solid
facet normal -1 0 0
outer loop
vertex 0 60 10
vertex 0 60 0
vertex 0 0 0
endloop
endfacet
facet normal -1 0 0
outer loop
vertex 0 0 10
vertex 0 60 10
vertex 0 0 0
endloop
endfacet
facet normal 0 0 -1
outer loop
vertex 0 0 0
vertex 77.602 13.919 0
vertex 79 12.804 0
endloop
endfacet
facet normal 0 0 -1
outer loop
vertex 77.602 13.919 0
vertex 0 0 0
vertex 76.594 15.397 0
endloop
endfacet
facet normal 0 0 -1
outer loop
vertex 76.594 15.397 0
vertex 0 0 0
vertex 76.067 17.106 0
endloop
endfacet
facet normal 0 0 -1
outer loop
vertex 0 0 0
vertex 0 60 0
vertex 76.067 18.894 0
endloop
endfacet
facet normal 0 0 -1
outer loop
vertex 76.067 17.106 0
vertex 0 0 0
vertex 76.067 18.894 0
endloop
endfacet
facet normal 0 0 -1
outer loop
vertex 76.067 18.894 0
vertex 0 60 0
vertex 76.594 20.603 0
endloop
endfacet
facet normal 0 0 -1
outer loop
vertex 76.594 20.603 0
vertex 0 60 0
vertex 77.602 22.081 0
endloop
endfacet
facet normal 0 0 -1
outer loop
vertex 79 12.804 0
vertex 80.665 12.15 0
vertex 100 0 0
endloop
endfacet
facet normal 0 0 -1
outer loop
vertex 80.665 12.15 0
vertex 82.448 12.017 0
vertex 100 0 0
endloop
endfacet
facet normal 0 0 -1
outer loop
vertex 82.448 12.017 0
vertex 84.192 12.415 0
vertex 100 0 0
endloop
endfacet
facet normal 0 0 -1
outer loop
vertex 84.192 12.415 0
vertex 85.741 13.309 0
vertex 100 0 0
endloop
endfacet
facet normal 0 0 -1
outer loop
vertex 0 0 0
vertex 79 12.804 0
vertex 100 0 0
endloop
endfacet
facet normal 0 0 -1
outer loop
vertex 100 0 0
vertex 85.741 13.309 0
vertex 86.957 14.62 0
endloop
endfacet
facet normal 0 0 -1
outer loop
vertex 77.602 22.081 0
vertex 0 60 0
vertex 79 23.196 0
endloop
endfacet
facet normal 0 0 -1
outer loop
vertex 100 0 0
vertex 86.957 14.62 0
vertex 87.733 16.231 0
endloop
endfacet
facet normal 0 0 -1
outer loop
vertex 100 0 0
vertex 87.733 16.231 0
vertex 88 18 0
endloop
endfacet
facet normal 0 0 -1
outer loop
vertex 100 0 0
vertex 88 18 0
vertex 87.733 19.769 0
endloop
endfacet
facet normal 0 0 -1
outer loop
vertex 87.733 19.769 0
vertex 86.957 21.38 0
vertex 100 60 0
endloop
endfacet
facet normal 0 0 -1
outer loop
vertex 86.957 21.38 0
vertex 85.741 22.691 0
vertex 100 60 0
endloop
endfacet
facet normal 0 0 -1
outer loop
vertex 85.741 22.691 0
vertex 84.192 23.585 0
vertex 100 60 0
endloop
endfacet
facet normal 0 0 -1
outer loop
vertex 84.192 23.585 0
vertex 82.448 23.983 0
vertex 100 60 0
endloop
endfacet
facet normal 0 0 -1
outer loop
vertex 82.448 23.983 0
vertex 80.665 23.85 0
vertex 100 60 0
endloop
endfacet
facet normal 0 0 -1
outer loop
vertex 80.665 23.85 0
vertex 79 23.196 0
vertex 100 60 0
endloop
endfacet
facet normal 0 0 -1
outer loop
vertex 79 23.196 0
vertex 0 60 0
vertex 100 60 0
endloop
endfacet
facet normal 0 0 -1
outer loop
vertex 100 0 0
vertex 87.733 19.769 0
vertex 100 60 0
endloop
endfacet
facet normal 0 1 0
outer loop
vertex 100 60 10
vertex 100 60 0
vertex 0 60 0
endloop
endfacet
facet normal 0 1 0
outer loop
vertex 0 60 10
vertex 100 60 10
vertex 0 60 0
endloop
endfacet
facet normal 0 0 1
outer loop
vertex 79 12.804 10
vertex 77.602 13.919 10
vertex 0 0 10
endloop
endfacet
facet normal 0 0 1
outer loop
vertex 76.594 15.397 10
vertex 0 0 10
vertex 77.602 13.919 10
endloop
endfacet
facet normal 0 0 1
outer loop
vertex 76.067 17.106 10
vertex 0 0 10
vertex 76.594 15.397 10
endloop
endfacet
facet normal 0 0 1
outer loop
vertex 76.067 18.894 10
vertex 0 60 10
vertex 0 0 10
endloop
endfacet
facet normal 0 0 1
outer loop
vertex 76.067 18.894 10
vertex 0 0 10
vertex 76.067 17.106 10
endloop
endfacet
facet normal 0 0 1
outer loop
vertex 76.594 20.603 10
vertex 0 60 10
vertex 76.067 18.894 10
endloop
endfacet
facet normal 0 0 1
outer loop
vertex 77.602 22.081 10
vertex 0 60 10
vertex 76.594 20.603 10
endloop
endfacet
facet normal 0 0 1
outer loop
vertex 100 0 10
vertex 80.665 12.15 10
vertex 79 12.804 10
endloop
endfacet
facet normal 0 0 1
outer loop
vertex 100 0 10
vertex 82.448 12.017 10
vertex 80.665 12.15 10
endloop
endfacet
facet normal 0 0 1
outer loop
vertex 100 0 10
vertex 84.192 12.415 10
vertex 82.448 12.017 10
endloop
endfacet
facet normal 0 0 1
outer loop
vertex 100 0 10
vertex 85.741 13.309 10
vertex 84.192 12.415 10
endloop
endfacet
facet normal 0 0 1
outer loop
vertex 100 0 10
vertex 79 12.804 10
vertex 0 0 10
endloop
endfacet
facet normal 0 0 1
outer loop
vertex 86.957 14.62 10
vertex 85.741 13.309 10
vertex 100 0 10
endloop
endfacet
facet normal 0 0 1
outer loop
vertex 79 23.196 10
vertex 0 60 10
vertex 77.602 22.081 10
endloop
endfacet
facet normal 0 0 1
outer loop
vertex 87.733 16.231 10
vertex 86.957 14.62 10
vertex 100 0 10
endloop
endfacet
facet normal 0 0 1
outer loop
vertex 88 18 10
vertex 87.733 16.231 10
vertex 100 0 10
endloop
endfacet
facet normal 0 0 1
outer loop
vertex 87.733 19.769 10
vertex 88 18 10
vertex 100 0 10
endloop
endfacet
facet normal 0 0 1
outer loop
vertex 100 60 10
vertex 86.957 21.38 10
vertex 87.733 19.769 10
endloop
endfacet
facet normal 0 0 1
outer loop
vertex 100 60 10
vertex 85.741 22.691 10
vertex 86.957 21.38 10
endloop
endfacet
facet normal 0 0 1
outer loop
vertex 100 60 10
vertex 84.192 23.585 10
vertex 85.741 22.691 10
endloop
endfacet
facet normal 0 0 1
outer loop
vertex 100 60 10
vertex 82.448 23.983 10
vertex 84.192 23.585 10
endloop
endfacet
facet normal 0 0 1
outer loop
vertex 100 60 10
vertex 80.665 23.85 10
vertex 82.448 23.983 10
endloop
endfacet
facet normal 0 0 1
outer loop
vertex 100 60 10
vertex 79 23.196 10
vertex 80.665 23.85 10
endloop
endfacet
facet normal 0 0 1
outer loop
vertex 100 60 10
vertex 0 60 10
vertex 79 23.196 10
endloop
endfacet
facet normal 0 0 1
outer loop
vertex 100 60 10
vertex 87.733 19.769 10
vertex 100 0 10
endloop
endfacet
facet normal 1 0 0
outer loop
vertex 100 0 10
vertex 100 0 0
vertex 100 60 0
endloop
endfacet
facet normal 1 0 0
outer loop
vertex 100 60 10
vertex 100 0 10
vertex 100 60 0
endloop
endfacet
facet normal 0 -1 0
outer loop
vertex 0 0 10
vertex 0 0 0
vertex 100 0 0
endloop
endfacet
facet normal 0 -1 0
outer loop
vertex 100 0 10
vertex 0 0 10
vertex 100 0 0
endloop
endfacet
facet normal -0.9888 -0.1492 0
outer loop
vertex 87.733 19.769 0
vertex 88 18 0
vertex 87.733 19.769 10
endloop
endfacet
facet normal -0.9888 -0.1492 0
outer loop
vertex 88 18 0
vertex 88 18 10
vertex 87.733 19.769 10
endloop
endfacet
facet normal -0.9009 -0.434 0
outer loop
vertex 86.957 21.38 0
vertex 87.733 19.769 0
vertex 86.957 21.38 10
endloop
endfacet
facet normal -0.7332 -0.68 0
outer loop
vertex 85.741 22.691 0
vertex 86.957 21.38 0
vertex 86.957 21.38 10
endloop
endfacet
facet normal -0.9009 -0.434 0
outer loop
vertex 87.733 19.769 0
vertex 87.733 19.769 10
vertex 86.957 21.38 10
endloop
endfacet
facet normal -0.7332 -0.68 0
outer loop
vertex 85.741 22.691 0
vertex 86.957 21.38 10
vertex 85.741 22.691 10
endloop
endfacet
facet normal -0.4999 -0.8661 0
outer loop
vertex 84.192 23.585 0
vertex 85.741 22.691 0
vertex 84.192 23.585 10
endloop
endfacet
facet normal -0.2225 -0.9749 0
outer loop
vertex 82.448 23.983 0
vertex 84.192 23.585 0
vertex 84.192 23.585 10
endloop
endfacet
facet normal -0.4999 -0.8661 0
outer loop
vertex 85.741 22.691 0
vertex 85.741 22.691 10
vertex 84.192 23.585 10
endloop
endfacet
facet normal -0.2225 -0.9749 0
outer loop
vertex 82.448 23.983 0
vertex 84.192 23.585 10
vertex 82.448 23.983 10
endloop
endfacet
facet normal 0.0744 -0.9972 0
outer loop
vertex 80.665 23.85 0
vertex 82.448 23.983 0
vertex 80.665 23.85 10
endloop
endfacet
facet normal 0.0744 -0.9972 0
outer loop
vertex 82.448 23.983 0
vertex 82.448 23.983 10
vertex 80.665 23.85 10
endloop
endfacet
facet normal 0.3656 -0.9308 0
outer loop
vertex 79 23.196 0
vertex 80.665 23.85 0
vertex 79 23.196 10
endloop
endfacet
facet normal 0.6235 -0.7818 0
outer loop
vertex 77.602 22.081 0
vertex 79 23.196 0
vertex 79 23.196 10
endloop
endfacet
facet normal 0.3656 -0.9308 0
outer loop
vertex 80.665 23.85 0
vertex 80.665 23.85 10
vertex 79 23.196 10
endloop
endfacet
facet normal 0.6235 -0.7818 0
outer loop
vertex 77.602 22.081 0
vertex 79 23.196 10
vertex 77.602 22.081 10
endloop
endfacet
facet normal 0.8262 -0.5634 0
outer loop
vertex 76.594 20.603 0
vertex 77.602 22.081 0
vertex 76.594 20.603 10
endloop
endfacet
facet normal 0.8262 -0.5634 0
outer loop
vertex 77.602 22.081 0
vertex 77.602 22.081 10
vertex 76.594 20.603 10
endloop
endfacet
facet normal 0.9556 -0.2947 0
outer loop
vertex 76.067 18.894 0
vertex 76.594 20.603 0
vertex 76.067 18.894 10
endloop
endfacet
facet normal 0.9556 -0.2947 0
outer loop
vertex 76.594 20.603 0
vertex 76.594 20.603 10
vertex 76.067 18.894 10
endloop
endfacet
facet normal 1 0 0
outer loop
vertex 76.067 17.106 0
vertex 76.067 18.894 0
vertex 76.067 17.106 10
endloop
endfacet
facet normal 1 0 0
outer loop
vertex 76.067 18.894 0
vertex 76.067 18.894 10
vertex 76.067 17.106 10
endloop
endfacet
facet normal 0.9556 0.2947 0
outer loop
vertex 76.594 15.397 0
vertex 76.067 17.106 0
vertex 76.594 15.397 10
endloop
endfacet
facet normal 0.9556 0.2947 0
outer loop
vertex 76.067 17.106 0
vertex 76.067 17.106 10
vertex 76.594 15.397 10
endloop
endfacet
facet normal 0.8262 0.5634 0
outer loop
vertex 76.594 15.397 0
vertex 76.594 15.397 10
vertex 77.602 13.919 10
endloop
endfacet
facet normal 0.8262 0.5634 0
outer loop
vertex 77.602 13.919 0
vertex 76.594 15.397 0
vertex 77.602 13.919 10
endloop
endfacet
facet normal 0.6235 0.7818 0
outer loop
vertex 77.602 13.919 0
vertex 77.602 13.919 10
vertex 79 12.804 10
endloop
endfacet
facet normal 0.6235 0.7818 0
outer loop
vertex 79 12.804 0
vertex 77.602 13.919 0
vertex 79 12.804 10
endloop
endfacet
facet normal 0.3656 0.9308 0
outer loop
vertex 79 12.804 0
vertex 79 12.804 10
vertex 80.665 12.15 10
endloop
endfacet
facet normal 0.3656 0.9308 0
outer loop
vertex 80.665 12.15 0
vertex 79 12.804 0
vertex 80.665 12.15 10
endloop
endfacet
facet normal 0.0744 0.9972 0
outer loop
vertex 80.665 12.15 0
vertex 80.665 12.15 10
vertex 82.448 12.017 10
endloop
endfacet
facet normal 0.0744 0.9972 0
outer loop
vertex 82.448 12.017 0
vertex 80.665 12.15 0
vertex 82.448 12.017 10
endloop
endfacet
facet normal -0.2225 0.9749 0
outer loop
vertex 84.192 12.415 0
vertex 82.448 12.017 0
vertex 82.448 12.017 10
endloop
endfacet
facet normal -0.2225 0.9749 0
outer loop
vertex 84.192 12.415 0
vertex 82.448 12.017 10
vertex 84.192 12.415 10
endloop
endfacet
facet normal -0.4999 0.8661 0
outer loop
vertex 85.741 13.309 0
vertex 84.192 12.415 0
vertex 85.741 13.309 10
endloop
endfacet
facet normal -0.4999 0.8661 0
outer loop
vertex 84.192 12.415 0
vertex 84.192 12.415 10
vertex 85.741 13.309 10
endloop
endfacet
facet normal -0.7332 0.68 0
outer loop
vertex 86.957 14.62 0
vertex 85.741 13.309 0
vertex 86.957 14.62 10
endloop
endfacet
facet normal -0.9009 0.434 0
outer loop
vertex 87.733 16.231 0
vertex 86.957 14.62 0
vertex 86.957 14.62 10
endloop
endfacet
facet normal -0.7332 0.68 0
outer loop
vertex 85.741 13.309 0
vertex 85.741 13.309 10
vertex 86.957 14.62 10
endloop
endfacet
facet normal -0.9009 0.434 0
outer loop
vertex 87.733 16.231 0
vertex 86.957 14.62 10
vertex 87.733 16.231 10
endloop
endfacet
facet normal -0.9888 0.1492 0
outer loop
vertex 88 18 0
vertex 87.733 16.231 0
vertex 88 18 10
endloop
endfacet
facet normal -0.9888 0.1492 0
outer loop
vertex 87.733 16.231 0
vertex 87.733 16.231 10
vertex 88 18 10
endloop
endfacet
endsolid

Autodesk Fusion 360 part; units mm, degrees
sketch "sketch_base_outline" plane through (0, 0, 0) normal (0, 0, 1) x (1, 0, 0)
  line L0 (0, 0) -> (100, 0)
  line L1 (100, 0) -> (100, 60)
  line L2 (100, 60) -> (0, 60)
  line L3 (0, 60) -> (0, 0)
extrude "Extrude1" add sketch "sketch_base_outline" along normal blind 10
sketch "sketch_inner_pocket" plane through (0, 0, 10) normal (0, 0, 1) x (1, 0, 0)
  line L0 (0, 60) -> (0, 0)
  line L1 (0, 0) -> (100, 0)
  line L2 (100, 0) -> (100, 60)
  line L3 (100, 60) -> (0, 60)
  line L4 (25, 15) -> (75, 15)
  line L5 (75, 15) -> (75, 45)
  line L6 (75, 45) -> (25, 45)
  line L7 (25, 45) -> (25, 15)
sketch "sketch_bore_hole" plane through (0, 0, 10) normal (0, 0, 1) x (1, 0, 0)
  line L0 (0, 60) -> (0, 0)
  line L1 (0, 0) -> (100, 0)
  line L2 (100, 0) -> (100, 60)
  line L3 (100, 60) -> (0, 60)
  circle A0 centre (82, 18) radius 6
extrude "bore_hole" cut sketch "sketch_bore_hole" against normal blind 10 contours A0
equation "d3 = -( 10 mm )"
